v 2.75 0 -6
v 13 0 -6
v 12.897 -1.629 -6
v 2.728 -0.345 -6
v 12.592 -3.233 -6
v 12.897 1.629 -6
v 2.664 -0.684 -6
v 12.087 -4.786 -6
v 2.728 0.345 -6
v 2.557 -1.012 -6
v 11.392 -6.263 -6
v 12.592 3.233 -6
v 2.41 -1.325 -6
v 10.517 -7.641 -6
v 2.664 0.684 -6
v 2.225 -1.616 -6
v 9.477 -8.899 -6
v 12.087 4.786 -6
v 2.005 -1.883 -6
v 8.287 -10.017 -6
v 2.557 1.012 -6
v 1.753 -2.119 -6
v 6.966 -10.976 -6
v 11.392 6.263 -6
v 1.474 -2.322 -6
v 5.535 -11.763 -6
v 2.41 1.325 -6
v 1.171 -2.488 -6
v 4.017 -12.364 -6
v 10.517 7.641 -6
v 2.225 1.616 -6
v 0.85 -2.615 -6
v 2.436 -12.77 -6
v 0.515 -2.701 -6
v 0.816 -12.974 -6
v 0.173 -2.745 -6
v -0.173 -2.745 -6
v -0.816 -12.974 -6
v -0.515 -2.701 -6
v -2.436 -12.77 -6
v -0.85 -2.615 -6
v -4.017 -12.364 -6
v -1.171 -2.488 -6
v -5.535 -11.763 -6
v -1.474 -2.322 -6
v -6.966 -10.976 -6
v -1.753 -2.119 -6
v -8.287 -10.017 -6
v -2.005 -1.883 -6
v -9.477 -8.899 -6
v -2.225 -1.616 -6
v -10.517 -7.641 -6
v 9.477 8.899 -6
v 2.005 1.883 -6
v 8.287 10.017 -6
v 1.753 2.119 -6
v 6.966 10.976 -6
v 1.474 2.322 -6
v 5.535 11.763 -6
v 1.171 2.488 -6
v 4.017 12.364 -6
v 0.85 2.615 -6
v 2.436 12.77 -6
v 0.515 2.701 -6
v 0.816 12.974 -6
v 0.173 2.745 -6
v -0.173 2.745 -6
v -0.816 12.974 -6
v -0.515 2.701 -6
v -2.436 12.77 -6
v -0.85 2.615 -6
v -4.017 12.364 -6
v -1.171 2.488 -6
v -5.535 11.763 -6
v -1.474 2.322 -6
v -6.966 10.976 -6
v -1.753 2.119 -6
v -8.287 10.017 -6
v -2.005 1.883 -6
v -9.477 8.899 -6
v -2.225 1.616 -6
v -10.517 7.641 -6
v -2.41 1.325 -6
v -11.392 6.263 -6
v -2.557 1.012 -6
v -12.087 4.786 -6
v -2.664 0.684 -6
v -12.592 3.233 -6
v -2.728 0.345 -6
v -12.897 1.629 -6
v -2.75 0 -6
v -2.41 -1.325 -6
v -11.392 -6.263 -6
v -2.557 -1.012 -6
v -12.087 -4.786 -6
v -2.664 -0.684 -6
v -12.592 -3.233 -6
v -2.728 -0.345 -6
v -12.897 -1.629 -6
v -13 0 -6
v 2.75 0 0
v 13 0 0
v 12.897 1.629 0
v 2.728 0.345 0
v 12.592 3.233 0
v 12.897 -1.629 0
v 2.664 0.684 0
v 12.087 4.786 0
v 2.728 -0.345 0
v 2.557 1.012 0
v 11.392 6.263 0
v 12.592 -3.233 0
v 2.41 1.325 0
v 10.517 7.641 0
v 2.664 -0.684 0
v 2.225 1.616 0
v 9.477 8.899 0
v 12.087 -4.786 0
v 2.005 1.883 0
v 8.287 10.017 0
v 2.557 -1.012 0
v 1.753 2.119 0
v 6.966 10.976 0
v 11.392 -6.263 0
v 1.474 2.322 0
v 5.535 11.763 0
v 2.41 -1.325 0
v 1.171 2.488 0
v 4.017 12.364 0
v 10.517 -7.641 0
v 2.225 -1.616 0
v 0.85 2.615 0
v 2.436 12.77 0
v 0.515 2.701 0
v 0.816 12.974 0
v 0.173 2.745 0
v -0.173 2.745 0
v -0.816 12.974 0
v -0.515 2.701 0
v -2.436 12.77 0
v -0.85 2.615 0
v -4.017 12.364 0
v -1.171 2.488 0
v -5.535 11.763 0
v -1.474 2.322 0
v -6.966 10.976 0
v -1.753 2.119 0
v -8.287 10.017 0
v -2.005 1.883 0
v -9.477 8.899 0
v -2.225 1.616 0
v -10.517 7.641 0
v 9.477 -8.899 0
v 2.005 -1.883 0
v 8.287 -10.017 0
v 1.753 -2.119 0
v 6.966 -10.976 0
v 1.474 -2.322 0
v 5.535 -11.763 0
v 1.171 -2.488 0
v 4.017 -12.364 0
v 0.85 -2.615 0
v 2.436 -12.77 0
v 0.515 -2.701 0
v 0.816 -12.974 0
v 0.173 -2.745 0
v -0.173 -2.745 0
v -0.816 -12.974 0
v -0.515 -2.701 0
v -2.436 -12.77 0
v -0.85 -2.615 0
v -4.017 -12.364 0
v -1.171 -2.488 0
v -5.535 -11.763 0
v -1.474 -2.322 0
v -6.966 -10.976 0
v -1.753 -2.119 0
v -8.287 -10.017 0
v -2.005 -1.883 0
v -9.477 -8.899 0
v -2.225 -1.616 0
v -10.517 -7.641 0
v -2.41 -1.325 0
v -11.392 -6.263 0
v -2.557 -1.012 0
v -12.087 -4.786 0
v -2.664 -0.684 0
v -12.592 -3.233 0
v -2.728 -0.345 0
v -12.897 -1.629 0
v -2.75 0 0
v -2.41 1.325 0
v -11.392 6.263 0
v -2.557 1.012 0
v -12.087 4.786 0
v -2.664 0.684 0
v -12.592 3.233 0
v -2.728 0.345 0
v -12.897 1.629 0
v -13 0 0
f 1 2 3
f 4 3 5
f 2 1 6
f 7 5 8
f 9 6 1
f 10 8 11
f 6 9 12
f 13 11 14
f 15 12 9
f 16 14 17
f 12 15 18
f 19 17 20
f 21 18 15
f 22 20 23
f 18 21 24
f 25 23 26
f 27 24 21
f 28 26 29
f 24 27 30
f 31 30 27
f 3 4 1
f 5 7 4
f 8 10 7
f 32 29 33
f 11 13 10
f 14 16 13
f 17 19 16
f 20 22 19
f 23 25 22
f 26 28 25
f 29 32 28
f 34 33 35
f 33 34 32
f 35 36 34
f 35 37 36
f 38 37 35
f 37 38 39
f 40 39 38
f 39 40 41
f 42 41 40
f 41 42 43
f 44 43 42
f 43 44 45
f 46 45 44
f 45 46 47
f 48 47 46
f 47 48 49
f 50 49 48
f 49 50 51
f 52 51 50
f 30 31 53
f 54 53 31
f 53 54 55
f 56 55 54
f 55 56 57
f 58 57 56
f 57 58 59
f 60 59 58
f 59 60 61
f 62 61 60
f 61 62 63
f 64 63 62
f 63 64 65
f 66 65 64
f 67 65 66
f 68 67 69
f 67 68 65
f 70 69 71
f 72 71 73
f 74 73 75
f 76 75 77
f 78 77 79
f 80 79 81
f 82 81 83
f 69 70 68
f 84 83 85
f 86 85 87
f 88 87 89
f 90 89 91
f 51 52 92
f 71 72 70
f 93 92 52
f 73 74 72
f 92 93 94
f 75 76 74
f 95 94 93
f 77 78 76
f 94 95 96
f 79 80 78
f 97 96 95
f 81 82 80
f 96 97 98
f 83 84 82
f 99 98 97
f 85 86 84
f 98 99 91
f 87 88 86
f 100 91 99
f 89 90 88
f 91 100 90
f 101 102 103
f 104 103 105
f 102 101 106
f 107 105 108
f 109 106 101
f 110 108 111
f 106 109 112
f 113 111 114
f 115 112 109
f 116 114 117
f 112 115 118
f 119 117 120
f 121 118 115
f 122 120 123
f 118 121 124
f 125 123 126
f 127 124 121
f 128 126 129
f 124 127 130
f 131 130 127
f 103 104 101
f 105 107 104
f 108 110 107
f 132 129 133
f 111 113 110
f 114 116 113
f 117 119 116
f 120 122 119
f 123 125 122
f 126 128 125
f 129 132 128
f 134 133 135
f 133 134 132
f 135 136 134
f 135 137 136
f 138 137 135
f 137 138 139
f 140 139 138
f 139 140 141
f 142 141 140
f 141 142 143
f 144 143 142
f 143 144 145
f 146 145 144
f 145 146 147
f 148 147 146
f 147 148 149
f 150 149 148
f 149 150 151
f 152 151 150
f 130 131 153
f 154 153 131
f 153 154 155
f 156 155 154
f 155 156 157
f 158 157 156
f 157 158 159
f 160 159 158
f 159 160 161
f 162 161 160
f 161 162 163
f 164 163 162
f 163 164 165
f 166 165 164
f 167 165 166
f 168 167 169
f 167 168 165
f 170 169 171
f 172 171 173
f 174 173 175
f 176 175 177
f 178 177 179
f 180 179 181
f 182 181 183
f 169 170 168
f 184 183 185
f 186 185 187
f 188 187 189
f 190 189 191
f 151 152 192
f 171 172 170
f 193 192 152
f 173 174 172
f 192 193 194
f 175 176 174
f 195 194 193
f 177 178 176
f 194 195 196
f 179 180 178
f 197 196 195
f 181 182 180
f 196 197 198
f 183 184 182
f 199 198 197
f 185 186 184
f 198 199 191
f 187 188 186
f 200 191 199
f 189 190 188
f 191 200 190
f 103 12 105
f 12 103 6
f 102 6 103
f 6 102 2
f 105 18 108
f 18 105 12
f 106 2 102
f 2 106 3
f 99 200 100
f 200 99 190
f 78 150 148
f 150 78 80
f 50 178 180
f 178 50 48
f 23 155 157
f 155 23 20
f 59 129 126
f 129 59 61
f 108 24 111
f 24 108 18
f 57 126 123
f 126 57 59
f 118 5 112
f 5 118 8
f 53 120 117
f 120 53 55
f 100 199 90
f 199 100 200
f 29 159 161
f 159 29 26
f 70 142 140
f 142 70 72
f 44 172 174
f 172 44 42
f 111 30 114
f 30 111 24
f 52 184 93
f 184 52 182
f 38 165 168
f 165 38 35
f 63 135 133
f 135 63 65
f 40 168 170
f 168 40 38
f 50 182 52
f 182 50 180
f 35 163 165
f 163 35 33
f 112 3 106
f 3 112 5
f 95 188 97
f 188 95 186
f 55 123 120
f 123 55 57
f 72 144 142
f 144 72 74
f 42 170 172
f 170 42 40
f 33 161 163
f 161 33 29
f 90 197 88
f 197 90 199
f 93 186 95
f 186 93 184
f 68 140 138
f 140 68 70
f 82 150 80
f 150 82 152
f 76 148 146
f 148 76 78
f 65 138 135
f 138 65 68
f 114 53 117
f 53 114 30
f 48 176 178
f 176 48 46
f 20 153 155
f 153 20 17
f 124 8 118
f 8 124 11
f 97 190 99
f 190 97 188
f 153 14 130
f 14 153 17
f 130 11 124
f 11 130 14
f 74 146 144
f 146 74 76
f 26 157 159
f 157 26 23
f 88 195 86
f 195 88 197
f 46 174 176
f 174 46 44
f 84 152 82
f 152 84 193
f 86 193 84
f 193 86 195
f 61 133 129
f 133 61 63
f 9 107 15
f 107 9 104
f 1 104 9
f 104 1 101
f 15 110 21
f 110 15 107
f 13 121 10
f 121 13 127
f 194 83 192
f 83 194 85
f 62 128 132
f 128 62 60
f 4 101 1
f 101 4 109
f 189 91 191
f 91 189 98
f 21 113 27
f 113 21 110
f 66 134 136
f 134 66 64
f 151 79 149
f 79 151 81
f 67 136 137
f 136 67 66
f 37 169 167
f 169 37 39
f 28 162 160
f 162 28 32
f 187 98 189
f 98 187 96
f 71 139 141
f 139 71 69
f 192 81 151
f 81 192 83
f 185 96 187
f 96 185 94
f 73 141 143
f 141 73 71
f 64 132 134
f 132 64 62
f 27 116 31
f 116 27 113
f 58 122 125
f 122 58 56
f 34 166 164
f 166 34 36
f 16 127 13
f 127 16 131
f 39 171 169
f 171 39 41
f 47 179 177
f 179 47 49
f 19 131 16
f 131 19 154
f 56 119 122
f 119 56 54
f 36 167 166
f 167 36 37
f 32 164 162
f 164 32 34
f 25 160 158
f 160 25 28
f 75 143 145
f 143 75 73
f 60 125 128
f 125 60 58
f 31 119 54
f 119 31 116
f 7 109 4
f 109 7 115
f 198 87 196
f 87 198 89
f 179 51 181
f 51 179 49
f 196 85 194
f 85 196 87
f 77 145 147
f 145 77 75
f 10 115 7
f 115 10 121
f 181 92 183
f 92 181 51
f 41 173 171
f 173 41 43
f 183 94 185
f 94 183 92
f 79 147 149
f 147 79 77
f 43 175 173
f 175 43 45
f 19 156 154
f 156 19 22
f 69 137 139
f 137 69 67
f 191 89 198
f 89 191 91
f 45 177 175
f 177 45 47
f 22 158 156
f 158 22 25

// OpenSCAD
$fn = 50;


difference() {
	union() {
		translate(v = [0, 0, -6.0000000000]) {
			cylinder(h = 6, r = 10.0000000000);
		}
		translate(v = [0, 0, -6.0000000000]) {
			cylinder(h = 6, r = 13.0000000000);
		}
	}
	union() {
		#translate(v = [0, 0, -6]) {
			cylinder(h = 6, r = 2.7500000000);
		}
	}
}
